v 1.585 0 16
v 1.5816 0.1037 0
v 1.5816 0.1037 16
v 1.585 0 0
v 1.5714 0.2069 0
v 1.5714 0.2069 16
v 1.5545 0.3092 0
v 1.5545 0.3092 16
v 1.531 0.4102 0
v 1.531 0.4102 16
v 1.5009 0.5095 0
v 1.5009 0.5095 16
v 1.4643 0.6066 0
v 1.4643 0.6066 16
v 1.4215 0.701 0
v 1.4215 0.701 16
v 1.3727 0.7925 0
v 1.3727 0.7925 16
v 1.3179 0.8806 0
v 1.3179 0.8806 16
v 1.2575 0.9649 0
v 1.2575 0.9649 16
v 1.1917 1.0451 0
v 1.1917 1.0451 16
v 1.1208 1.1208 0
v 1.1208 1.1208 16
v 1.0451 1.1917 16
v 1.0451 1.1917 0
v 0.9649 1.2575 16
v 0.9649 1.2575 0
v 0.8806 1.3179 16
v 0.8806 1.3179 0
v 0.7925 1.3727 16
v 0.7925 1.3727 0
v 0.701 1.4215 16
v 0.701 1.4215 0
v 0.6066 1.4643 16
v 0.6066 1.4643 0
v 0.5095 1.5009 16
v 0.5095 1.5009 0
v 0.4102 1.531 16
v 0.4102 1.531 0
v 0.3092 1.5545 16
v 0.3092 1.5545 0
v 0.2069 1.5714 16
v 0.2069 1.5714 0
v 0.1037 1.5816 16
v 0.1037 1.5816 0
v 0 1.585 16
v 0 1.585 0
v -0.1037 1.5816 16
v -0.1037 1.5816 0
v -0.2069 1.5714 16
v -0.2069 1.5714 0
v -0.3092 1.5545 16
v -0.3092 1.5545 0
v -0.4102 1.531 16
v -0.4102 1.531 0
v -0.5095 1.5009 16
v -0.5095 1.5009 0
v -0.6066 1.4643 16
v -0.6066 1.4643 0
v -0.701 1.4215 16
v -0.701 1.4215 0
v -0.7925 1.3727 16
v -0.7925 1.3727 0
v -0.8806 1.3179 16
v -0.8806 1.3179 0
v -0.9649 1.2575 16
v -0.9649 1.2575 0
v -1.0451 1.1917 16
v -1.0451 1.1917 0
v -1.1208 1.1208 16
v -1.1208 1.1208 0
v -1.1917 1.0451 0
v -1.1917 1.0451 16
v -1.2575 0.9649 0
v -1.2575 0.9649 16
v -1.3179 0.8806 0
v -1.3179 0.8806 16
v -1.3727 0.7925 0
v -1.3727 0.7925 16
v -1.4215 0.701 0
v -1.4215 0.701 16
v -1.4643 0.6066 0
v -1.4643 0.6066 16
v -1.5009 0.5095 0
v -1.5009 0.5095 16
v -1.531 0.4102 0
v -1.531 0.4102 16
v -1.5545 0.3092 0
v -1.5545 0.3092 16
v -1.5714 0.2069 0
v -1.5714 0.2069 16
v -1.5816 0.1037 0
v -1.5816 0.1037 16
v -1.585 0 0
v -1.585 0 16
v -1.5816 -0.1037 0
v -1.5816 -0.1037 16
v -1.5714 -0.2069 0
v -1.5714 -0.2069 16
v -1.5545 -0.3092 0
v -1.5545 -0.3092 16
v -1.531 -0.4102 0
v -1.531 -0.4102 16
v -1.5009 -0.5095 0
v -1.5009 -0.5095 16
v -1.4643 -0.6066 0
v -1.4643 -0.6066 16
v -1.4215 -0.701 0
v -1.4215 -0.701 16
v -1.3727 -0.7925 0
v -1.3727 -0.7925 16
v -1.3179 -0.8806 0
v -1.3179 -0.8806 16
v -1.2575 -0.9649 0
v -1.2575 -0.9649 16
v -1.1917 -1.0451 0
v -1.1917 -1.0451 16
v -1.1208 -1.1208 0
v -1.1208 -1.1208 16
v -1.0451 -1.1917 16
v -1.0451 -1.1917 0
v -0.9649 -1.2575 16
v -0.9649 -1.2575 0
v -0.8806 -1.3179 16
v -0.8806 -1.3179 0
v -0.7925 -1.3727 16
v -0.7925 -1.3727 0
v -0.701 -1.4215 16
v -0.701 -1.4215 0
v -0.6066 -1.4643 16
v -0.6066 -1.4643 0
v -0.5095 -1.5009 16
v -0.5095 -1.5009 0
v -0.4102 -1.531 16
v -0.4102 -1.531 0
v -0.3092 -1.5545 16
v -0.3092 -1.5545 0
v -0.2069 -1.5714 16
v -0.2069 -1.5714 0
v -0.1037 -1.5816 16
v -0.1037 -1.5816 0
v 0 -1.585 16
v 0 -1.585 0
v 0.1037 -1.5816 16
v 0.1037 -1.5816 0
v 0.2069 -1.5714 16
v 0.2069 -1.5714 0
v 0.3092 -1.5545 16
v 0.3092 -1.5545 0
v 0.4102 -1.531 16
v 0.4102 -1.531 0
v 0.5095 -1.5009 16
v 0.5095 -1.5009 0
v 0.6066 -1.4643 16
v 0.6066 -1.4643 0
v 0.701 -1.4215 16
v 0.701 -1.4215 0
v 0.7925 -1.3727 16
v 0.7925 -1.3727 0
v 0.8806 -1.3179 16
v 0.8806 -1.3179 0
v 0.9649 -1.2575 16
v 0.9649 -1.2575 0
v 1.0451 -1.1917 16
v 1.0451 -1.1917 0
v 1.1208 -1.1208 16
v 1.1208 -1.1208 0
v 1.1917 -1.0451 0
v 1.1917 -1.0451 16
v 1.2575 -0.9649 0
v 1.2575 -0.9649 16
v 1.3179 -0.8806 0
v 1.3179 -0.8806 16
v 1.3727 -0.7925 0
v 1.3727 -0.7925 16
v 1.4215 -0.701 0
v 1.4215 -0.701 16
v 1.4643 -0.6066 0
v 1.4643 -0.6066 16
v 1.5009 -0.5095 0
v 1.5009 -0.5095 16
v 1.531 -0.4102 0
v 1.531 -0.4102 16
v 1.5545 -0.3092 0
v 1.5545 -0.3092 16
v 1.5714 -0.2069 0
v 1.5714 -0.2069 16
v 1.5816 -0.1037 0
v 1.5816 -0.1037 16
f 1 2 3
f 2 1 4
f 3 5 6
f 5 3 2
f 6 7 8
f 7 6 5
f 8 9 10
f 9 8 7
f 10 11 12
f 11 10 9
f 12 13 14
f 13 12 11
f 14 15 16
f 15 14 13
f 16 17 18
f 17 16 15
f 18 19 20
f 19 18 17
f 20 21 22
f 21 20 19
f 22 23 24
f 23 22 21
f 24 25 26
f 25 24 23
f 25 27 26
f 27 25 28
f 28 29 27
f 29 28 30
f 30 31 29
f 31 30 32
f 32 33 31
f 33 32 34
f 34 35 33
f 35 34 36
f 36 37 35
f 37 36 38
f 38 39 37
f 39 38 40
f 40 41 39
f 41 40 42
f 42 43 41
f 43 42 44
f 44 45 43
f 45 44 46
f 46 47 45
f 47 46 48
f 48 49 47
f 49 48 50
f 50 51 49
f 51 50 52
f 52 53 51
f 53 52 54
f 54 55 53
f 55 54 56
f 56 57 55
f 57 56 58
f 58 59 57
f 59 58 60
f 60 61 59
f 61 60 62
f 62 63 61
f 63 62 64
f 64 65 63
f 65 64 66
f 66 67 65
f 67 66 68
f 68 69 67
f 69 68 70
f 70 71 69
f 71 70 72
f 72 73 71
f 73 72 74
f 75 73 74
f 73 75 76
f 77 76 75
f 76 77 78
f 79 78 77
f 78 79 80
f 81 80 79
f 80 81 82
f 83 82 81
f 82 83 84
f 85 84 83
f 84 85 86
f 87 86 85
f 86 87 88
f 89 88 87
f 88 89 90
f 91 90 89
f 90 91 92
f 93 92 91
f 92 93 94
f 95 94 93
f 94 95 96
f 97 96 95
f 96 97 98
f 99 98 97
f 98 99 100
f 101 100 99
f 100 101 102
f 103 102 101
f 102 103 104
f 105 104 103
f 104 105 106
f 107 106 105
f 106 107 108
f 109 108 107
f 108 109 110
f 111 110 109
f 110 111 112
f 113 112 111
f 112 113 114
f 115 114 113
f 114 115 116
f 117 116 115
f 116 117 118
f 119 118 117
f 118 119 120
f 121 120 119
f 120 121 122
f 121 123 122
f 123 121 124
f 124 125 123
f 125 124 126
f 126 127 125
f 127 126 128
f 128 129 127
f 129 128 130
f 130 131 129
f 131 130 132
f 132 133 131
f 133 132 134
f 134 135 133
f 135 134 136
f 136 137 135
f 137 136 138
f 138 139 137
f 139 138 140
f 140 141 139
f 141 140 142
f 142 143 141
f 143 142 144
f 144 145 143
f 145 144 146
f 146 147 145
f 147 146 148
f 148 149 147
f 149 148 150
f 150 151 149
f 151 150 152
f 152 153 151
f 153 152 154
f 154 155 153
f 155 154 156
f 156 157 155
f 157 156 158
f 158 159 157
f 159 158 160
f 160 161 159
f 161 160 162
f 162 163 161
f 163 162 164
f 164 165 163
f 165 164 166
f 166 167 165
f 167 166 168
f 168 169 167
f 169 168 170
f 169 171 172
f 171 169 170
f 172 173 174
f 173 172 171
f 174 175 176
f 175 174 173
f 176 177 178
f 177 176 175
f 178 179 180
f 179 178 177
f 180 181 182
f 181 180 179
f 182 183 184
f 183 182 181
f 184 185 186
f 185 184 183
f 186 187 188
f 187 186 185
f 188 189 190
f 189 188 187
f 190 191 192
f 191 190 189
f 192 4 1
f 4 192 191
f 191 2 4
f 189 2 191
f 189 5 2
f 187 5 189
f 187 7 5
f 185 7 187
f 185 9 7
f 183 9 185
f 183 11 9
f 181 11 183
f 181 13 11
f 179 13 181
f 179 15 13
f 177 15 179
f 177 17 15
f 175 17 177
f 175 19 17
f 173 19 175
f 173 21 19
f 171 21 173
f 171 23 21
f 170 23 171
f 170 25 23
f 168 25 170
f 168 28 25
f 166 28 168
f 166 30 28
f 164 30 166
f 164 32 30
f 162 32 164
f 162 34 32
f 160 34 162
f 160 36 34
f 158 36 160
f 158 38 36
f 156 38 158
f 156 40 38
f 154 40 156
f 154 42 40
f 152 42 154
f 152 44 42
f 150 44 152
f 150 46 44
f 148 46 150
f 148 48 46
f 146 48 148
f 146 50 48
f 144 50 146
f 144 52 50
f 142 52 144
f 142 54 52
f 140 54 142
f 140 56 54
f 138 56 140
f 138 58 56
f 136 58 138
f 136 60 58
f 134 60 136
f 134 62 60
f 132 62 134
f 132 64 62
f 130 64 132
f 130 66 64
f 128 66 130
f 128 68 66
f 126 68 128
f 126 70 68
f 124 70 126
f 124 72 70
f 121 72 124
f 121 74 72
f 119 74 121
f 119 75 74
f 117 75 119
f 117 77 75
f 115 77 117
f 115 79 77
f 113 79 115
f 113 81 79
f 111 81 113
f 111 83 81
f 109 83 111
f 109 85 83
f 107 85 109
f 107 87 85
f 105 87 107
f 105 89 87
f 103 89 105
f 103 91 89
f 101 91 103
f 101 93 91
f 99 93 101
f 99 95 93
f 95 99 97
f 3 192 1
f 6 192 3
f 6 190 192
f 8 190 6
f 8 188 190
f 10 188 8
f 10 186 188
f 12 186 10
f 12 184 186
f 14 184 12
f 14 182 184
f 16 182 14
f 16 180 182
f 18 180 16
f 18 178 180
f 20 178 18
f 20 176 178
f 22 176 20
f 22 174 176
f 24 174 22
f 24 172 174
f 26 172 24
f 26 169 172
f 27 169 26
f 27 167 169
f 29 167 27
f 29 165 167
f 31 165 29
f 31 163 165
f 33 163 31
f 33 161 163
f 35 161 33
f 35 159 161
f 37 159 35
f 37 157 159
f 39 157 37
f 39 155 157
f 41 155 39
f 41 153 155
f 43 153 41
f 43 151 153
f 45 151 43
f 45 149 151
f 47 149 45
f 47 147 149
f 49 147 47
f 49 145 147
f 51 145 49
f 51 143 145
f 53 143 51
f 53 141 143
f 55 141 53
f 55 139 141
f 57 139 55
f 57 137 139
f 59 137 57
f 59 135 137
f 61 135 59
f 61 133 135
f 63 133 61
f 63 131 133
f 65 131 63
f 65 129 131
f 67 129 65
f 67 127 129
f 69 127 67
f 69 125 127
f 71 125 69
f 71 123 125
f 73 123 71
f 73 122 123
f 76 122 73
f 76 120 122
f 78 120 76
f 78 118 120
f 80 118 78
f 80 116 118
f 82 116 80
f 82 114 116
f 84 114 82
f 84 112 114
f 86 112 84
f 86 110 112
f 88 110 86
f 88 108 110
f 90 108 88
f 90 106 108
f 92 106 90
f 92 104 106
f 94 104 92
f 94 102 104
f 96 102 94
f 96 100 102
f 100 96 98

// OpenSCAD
$fn=96;

thread_d = 2.0;      // nominal thread diameter (mm)
length   = 16.0;     // overall length (mm)
outer_d  = 3.17;     // pillar outer diameter (mm)

cylinder(h=length, d=outer_d, center=false);
